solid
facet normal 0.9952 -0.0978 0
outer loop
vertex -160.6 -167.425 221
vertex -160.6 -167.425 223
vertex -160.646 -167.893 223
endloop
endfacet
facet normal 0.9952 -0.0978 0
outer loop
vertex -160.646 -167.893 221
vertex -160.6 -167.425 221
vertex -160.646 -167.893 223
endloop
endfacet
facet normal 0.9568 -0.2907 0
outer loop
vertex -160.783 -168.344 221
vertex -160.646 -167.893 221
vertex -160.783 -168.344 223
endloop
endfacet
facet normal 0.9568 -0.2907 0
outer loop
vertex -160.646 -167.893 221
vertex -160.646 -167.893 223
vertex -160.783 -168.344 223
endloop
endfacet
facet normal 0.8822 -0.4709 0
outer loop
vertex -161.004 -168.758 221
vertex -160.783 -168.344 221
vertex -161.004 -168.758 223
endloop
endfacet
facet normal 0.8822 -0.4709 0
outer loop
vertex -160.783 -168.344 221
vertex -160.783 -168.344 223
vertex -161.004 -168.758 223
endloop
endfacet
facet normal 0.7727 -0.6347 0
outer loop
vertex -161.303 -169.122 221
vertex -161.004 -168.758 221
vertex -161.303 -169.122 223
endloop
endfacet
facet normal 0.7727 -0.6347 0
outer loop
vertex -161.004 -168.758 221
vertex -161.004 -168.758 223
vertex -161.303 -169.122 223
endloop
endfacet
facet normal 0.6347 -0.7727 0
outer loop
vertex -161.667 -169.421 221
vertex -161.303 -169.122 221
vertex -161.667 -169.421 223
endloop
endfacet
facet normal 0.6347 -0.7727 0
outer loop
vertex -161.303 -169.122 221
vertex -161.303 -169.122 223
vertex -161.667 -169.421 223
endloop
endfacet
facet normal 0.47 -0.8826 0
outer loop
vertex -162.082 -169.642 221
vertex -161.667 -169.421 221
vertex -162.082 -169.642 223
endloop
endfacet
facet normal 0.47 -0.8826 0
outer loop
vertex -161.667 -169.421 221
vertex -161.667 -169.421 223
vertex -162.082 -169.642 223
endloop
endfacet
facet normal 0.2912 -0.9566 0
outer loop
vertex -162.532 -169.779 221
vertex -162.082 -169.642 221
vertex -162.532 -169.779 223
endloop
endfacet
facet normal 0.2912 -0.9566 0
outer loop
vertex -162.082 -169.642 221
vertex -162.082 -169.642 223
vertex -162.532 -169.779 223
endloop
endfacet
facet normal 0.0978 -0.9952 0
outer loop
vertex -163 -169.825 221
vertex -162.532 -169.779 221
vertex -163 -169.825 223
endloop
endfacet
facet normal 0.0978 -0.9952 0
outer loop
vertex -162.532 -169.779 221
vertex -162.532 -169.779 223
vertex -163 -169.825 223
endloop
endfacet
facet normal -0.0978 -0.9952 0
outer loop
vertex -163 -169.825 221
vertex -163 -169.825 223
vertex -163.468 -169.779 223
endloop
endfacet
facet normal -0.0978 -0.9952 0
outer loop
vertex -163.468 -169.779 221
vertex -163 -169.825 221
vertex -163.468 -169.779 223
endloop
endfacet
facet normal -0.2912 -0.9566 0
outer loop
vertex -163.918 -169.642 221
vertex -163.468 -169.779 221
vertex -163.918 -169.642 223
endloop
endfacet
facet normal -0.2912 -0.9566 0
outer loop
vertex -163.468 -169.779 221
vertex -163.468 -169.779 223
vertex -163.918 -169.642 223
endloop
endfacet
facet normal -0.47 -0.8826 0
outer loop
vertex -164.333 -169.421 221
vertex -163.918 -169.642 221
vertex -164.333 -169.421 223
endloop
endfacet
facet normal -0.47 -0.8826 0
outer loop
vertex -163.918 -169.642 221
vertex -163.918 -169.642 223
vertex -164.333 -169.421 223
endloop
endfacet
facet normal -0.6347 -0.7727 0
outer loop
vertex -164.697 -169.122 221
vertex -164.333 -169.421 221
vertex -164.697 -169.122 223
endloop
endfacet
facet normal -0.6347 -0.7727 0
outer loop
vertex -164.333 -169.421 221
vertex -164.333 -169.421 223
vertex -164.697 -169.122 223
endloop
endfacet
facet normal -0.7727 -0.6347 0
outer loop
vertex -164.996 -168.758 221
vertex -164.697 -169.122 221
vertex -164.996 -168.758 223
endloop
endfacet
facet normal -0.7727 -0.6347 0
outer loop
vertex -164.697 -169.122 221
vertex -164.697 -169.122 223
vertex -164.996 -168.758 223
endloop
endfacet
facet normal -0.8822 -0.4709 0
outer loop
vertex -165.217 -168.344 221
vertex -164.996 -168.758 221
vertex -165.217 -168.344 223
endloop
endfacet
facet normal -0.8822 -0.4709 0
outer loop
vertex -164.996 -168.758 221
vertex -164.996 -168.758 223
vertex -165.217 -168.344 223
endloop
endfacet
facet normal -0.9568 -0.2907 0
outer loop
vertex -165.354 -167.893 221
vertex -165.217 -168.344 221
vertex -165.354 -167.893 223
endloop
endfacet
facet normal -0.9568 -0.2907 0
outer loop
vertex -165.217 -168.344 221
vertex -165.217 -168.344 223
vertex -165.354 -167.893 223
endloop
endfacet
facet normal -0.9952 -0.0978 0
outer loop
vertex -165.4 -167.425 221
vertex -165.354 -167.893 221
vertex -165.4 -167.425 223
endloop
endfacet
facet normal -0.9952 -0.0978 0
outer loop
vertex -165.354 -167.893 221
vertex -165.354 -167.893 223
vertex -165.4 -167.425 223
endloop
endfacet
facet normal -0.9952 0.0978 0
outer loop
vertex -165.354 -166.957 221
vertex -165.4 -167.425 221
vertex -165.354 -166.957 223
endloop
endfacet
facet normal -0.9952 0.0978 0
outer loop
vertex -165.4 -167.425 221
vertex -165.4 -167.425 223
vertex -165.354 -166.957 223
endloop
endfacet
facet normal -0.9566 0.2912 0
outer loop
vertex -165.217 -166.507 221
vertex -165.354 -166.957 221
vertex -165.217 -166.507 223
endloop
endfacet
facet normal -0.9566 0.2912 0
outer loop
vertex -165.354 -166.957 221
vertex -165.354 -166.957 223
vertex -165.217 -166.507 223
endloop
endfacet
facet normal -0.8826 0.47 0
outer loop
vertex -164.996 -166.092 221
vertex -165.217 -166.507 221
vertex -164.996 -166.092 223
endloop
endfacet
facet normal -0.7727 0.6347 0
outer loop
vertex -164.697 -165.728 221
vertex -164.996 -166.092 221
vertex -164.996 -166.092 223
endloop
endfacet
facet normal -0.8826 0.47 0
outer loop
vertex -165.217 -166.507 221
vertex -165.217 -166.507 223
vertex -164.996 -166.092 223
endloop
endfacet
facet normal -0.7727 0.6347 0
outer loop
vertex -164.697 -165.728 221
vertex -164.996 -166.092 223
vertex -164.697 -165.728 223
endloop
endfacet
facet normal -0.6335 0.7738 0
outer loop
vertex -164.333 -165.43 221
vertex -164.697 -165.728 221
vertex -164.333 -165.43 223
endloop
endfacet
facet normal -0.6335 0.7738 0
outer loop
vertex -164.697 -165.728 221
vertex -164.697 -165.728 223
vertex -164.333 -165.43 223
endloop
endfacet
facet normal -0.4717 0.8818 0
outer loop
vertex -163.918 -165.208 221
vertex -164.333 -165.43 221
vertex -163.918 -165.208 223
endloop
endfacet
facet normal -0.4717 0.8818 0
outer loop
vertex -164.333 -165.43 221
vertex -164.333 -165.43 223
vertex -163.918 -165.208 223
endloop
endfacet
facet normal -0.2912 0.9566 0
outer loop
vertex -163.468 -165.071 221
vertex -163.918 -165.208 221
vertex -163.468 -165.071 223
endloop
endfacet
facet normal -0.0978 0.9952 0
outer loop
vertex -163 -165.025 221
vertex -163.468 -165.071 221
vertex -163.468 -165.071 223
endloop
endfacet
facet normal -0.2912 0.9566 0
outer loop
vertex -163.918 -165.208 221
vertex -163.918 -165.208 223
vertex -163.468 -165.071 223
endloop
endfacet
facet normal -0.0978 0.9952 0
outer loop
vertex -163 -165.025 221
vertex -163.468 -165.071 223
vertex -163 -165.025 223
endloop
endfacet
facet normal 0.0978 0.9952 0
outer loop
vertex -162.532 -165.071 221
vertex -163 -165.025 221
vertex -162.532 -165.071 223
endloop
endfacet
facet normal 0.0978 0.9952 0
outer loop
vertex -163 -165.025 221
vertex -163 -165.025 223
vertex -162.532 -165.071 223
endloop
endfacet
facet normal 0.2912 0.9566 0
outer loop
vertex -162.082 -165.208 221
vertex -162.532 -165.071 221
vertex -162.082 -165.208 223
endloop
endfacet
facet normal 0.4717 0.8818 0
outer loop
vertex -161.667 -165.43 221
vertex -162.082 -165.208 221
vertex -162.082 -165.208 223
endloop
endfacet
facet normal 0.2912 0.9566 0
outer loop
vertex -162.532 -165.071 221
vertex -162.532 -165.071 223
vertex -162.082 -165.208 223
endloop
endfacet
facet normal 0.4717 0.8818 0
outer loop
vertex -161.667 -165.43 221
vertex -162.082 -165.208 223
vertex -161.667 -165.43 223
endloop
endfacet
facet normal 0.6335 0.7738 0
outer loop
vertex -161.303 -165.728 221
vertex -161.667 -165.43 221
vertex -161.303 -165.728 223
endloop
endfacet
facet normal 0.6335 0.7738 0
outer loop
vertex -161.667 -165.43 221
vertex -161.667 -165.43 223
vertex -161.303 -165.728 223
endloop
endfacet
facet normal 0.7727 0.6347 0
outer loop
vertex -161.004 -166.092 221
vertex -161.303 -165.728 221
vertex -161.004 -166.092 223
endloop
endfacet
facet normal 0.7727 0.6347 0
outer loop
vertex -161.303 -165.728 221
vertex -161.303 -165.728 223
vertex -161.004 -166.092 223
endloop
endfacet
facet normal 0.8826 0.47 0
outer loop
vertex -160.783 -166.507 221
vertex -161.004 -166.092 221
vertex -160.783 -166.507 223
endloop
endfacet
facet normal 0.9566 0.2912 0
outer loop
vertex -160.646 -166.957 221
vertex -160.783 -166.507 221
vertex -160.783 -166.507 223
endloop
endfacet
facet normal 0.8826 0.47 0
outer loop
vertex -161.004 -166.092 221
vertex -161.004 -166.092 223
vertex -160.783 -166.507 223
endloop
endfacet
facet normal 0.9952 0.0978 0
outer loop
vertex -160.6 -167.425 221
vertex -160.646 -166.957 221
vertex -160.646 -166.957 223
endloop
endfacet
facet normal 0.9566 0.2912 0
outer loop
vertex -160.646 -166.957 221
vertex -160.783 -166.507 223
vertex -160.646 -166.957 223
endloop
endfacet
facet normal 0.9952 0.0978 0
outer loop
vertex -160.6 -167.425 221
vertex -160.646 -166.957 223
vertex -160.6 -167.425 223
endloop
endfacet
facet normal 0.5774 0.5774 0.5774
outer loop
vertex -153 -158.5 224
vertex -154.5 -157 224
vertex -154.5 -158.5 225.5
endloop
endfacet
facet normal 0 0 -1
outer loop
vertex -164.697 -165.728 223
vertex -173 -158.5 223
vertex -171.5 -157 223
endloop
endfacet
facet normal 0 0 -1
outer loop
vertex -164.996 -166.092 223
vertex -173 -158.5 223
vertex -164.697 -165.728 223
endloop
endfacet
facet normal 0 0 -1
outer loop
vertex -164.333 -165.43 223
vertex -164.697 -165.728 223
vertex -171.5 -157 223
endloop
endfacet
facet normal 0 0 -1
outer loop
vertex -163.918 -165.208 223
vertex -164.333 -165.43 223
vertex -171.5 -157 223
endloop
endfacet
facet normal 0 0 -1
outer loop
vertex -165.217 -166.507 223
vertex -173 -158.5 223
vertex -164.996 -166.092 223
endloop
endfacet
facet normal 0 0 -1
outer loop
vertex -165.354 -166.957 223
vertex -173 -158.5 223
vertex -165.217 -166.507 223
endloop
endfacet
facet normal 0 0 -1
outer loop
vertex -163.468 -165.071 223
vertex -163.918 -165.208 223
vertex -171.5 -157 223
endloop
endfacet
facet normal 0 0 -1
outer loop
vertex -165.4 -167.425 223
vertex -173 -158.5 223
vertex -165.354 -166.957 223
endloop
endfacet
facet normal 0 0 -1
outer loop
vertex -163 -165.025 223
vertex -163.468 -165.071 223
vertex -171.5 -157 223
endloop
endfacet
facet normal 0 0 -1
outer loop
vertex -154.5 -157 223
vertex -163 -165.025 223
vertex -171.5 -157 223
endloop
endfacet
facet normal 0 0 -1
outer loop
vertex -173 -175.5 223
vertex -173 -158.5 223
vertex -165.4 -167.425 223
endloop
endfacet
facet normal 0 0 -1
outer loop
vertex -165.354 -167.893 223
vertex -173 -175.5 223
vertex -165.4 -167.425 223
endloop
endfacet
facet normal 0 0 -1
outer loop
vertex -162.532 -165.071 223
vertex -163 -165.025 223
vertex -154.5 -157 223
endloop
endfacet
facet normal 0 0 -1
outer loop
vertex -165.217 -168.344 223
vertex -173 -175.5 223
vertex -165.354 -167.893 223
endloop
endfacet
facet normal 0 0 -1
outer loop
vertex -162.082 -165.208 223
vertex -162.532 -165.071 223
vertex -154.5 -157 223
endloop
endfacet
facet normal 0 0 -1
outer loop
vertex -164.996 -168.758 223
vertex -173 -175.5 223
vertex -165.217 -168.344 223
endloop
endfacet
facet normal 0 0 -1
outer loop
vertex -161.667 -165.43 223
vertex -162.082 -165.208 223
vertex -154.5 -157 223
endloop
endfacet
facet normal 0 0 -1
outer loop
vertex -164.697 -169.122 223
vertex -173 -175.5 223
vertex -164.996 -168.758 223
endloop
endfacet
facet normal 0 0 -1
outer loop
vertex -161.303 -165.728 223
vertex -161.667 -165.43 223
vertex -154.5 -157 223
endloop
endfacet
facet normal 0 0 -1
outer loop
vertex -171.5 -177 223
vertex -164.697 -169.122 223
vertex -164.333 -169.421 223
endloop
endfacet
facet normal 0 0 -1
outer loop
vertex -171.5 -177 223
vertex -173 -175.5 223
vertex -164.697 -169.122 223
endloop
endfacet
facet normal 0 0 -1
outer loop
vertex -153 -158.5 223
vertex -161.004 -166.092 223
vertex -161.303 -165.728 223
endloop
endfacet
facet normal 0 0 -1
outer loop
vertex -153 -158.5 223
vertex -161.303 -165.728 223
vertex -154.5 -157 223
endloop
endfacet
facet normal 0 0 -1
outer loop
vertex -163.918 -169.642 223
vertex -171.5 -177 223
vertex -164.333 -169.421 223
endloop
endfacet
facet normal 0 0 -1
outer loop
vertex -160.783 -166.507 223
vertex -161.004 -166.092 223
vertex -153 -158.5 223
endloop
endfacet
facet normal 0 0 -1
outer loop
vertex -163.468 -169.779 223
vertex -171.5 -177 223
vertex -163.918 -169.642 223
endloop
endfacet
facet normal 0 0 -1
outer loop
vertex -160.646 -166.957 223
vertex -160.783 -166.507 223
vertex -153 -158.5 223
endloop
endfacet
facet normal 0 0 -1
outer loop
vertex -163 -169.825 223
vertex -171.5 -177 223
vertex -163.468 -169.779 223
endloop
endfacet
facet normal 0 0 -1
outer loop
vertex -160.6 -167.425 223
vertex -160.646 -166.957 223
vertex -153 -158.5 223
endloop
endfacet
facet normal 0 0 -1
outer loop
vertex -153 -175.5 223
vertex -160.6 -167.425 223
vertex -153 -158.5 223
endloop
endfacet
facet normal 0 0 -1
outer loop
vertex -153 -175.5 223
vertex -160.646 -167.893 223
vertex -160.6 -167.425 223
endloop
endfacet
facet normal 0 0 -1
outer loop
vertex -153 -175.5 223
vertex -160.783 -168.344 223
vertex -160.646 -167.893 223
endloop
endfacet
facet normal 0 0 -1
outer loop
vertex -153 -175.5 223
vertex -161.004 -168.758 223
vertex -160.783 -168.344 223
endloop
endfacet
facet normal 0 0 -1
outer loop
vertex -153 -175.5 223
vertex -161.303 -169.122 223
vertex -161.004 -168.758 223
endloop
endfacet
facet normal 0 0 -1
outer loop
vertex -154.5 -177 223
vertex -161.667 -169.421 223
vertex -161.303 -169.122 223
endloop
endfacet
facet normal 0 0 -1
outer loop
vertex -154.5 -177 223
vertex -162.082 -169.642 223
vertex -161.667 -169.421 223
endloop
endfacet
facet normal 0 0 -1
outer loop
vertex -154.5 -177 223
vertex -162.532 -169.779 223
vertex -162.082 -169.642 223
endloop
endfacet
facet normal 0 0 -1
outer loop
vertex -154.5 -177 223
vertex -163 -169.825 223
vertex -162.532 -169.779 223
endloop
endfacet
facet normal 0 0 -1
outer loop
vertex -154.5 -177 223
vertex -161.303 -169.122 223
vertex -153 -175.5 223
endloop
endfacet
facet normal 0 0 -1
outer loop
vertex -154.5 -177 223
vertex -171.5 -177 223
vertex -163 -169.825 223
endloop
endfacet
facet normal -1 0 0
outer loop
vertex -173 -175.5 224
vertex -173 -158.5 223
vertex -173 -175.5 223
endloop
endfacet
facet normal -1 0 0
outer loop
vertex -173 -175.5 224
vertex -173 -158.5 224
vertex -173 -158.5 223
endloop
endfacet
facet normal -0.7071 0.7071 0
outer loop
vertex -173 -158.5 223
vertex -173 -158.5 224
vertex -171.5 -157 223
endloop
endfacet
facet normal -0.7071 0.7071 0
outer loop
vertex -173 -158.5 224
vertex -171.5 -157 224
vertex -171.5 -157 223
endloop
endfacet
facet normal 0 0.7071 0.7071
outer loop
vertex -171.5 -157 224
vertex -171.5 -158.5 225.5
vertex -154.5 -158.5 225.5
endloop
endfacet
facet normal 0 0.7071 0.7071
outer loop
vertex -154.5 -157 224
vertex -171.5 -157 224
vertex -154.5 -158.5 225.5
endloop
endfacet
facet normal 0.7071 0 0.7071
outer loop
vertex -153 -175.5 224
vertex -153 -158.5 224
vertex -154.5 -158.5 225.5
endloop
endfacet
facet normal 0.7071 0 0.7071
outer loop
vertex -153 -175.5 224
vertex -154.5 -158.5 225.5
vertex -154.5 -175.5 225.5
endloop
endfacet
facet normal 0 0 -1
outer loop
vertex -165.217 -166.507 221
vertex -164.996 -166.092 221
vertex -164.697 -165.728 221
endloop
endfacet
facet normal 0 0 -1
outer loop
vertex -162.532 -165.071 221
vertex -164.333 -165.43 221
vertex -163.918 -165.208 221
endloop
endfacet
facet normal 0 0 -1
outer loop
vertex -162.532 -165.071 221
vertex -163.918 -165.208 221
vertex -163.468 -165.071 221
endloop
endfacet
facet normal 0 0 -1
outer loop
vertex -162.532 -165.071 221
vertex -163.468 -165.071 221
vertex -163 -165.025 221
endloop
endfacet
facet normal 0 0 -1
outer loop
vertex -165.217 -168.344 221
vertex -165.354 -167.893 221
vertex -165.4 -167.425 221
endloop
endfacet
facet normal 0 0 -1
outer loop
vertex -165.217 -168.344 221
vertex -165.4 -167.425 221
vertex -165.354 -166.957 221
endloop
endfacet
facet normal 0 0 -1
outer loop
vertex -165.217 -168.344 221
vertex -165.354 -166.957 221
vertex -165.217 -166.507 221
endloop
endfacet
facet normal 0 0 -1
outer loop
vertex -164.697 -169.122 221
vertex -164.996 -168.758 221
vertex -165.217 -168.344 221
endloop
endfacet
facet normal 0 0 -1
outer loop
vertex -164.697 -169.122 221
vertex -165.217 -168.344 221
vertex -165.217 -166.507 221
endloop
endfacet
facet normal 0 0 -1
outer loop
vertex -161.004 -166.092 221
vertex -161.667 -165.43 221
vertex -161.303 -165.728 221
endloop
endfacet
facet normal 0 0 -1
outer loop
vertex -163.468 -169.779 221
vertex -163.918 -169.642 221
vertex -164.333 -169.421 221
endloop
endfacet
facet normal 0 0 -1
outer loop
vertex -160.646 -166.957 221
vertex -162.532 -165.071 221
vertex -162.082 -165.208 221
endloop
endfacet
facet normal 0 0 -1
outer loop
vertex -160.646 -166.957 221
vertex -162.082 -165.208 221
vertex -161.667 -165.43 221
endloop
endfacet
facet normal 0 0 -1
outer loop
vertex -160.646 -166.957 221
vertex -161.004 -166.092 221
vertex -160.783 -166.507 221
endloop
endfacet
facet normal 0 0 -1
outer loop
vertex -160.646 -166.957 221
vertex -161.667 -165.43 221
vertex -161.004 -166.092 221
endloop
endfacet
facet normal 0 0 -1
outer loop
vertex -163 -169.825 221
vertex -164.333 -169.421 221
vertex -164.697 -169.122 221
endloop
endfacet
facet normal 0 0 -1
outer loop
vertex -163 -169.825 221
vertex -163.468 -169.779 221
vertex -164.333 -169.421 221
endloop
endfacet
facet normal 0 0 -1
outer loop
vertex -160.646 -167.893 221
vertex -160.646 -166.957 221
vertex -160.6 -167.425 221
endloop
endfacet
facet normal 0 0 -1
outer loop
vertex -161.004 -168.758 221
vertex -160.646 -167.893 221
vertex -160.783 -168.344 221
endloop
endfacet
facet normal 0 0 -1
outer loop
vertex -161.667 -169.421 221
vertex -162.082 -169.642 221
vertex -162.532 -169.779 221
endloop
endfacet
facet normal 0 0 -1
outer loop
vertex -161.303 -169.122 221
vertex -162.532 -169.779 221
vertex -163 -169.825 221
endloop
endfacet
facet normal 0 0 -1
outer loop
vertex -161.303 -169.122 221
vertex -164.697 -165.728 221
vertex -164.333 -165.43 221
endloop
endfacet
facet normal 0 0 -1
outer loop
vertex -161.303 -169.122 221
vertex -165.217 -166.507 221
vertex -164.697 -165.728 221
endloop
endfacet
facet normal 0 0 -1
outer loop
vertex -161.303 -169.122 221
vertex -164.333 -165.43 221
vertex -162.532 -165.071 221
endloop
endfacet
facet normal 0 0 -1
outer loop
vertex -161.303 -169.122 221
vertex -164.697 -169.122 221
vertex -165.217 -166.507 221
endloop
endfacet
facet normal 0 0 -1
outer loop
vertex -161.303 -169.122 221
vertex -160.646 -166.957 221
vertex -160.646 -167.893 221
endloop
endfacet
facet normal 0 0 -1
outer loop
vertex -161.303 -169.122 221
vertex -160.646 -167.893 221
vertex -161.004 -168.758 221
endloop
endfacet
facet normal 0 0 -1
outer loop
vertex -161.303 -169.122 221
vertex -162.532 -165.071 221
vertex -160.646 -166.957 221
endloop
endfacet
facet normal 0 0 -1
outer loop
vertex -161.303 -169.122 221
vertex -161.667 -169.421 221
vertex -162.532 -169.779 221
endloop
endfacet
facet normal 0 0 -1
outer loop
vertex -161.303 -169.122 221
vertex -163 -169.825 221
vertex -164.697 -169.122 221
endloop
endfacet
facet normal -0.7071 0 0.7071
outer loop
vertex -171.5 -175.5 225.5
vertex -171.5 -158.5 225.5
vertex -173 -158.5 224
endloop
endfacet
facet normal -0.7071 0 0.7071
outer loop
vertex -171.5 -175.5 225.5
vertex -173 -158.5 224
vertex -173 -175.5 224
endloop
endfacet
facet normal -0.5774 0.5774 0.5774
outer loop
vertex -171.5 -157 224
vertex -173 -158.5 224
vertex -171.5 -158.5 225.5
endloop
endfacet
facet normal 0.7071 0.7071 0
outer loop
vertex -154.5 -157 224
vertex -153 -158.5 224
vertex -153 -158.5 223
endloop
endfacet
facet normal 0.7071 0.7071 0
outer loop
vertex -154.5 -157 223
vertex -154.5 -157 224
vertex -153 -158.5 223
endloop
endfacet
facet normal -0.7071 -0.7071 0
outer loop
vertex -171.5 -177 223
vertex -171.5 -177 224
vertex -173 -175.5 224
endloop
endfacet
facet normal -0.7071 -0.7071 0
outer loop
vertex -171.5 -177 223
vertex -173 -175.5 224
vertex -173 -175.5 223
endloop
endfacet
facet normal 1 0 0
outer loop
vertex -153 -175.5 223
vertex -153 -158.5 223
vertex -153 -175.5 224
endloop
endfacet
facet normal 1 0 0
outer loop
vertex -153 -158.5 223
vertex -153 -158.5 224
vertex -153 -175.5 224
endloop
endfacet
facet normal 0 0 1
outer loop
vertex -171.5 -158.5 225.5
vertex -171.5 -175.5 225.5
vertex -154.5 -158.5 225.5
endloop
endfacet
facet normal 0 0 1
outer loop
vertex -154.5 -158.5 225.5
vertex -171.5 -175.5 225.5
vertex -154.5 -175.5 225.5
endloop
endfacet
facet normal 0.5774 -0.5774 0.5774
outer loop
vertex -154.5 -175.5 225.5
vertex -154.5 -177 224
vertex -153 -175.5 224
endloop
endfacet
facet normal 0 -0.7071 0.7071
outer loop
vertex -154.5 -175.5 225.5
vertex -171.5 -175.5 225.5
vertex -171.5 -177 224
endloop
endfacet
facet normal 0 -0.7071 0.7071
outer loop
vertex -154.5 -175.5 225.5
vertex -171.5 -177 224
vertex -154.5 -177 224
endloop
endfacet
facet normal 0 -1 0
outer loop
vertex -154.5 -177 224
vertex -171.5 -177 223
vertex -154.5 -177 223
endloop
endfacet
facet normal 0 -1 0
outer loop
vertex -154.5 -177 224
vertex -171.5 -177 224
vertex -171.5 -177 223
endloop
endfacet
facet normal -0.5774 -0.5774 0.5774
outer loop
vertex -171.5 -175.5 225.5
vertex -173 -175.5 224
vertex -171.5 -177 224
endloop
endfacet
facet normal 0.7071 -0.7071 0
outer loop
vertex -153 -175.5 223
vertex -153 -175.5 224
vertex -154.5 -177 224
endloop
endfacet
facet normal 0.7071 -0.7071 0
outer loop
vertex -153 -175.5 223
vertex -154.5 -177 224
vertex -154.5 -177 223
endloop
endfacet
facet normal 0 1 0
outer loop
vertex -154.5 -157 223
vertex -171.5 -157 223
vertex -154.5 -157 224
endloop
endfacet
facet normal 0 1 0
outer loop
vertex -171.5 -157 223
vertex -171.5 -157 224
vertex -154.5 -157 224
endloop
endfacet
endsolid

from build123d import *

# Parameters (mm, degrees)
BOX063_W                   = 20
BOX063_H                   = 20
BOX063_DEPTH               = 2.5
SKETCH051_R                = 2.4
PAD018_DEPTH               = 2
CHAMFER003_SIZE            = 1.5
CHAMFER003_PLACEMENT_ANGLE = 180


with BuildPart() as cubo046:
    # Box063 → Box063 (new body)
    with BuildSketch(Plane.XY):
        with Locations((10, 10)):
            Rectangle(BOX063_W, BOX063_H)
    extrude(amount=BOX063_DEPTH)


with BuildPart() as pad018:
    # Pad018 base: copy of Cubo046
    add(cubo046.part)

    # Sketch051 → Pad018 (new body)
    with BuildSketch(Plane.XY.offset(2.5)):
        with Locations((10, 10.425099)):
            Circle(SKETCH051_R)
    extrude(amount=PAD018_DEPTH)


with BuildPart() as chamfer003:
    # Fusion039 base: copy of Cubo046
    add(cubo046.part)

    # Fusion039: union Pad018
    add(pad018.part)

    # Chamfer003
    chamfer003_edges = [chamfer003.edges().sort_by_distance(p)[0] for p in [
        (0, 0, 1.25),
        (0, 10, 0),
        (0, 20, 1.25),
        (10, 0, 0),
        (20, 0, 1.25),
        (10, 20, 0),
        (20, 20, 1.25),
        (20, 10, 0),
    ]]
    chamfer(chamfer003_edges, length=CHAMFER003_SIZE)


with BuildPart() as chamfer003_1:
    # Chamfer003 placement: moved
    add(chamfer003.part.moved(Location((-173, -157, 225.5))).rotate(Axis((-173, -157, 225.5), (1, 0, 0)), CHAMFER003_PLACEMENT_ANGLE))


solid = chamfer003_1.part
